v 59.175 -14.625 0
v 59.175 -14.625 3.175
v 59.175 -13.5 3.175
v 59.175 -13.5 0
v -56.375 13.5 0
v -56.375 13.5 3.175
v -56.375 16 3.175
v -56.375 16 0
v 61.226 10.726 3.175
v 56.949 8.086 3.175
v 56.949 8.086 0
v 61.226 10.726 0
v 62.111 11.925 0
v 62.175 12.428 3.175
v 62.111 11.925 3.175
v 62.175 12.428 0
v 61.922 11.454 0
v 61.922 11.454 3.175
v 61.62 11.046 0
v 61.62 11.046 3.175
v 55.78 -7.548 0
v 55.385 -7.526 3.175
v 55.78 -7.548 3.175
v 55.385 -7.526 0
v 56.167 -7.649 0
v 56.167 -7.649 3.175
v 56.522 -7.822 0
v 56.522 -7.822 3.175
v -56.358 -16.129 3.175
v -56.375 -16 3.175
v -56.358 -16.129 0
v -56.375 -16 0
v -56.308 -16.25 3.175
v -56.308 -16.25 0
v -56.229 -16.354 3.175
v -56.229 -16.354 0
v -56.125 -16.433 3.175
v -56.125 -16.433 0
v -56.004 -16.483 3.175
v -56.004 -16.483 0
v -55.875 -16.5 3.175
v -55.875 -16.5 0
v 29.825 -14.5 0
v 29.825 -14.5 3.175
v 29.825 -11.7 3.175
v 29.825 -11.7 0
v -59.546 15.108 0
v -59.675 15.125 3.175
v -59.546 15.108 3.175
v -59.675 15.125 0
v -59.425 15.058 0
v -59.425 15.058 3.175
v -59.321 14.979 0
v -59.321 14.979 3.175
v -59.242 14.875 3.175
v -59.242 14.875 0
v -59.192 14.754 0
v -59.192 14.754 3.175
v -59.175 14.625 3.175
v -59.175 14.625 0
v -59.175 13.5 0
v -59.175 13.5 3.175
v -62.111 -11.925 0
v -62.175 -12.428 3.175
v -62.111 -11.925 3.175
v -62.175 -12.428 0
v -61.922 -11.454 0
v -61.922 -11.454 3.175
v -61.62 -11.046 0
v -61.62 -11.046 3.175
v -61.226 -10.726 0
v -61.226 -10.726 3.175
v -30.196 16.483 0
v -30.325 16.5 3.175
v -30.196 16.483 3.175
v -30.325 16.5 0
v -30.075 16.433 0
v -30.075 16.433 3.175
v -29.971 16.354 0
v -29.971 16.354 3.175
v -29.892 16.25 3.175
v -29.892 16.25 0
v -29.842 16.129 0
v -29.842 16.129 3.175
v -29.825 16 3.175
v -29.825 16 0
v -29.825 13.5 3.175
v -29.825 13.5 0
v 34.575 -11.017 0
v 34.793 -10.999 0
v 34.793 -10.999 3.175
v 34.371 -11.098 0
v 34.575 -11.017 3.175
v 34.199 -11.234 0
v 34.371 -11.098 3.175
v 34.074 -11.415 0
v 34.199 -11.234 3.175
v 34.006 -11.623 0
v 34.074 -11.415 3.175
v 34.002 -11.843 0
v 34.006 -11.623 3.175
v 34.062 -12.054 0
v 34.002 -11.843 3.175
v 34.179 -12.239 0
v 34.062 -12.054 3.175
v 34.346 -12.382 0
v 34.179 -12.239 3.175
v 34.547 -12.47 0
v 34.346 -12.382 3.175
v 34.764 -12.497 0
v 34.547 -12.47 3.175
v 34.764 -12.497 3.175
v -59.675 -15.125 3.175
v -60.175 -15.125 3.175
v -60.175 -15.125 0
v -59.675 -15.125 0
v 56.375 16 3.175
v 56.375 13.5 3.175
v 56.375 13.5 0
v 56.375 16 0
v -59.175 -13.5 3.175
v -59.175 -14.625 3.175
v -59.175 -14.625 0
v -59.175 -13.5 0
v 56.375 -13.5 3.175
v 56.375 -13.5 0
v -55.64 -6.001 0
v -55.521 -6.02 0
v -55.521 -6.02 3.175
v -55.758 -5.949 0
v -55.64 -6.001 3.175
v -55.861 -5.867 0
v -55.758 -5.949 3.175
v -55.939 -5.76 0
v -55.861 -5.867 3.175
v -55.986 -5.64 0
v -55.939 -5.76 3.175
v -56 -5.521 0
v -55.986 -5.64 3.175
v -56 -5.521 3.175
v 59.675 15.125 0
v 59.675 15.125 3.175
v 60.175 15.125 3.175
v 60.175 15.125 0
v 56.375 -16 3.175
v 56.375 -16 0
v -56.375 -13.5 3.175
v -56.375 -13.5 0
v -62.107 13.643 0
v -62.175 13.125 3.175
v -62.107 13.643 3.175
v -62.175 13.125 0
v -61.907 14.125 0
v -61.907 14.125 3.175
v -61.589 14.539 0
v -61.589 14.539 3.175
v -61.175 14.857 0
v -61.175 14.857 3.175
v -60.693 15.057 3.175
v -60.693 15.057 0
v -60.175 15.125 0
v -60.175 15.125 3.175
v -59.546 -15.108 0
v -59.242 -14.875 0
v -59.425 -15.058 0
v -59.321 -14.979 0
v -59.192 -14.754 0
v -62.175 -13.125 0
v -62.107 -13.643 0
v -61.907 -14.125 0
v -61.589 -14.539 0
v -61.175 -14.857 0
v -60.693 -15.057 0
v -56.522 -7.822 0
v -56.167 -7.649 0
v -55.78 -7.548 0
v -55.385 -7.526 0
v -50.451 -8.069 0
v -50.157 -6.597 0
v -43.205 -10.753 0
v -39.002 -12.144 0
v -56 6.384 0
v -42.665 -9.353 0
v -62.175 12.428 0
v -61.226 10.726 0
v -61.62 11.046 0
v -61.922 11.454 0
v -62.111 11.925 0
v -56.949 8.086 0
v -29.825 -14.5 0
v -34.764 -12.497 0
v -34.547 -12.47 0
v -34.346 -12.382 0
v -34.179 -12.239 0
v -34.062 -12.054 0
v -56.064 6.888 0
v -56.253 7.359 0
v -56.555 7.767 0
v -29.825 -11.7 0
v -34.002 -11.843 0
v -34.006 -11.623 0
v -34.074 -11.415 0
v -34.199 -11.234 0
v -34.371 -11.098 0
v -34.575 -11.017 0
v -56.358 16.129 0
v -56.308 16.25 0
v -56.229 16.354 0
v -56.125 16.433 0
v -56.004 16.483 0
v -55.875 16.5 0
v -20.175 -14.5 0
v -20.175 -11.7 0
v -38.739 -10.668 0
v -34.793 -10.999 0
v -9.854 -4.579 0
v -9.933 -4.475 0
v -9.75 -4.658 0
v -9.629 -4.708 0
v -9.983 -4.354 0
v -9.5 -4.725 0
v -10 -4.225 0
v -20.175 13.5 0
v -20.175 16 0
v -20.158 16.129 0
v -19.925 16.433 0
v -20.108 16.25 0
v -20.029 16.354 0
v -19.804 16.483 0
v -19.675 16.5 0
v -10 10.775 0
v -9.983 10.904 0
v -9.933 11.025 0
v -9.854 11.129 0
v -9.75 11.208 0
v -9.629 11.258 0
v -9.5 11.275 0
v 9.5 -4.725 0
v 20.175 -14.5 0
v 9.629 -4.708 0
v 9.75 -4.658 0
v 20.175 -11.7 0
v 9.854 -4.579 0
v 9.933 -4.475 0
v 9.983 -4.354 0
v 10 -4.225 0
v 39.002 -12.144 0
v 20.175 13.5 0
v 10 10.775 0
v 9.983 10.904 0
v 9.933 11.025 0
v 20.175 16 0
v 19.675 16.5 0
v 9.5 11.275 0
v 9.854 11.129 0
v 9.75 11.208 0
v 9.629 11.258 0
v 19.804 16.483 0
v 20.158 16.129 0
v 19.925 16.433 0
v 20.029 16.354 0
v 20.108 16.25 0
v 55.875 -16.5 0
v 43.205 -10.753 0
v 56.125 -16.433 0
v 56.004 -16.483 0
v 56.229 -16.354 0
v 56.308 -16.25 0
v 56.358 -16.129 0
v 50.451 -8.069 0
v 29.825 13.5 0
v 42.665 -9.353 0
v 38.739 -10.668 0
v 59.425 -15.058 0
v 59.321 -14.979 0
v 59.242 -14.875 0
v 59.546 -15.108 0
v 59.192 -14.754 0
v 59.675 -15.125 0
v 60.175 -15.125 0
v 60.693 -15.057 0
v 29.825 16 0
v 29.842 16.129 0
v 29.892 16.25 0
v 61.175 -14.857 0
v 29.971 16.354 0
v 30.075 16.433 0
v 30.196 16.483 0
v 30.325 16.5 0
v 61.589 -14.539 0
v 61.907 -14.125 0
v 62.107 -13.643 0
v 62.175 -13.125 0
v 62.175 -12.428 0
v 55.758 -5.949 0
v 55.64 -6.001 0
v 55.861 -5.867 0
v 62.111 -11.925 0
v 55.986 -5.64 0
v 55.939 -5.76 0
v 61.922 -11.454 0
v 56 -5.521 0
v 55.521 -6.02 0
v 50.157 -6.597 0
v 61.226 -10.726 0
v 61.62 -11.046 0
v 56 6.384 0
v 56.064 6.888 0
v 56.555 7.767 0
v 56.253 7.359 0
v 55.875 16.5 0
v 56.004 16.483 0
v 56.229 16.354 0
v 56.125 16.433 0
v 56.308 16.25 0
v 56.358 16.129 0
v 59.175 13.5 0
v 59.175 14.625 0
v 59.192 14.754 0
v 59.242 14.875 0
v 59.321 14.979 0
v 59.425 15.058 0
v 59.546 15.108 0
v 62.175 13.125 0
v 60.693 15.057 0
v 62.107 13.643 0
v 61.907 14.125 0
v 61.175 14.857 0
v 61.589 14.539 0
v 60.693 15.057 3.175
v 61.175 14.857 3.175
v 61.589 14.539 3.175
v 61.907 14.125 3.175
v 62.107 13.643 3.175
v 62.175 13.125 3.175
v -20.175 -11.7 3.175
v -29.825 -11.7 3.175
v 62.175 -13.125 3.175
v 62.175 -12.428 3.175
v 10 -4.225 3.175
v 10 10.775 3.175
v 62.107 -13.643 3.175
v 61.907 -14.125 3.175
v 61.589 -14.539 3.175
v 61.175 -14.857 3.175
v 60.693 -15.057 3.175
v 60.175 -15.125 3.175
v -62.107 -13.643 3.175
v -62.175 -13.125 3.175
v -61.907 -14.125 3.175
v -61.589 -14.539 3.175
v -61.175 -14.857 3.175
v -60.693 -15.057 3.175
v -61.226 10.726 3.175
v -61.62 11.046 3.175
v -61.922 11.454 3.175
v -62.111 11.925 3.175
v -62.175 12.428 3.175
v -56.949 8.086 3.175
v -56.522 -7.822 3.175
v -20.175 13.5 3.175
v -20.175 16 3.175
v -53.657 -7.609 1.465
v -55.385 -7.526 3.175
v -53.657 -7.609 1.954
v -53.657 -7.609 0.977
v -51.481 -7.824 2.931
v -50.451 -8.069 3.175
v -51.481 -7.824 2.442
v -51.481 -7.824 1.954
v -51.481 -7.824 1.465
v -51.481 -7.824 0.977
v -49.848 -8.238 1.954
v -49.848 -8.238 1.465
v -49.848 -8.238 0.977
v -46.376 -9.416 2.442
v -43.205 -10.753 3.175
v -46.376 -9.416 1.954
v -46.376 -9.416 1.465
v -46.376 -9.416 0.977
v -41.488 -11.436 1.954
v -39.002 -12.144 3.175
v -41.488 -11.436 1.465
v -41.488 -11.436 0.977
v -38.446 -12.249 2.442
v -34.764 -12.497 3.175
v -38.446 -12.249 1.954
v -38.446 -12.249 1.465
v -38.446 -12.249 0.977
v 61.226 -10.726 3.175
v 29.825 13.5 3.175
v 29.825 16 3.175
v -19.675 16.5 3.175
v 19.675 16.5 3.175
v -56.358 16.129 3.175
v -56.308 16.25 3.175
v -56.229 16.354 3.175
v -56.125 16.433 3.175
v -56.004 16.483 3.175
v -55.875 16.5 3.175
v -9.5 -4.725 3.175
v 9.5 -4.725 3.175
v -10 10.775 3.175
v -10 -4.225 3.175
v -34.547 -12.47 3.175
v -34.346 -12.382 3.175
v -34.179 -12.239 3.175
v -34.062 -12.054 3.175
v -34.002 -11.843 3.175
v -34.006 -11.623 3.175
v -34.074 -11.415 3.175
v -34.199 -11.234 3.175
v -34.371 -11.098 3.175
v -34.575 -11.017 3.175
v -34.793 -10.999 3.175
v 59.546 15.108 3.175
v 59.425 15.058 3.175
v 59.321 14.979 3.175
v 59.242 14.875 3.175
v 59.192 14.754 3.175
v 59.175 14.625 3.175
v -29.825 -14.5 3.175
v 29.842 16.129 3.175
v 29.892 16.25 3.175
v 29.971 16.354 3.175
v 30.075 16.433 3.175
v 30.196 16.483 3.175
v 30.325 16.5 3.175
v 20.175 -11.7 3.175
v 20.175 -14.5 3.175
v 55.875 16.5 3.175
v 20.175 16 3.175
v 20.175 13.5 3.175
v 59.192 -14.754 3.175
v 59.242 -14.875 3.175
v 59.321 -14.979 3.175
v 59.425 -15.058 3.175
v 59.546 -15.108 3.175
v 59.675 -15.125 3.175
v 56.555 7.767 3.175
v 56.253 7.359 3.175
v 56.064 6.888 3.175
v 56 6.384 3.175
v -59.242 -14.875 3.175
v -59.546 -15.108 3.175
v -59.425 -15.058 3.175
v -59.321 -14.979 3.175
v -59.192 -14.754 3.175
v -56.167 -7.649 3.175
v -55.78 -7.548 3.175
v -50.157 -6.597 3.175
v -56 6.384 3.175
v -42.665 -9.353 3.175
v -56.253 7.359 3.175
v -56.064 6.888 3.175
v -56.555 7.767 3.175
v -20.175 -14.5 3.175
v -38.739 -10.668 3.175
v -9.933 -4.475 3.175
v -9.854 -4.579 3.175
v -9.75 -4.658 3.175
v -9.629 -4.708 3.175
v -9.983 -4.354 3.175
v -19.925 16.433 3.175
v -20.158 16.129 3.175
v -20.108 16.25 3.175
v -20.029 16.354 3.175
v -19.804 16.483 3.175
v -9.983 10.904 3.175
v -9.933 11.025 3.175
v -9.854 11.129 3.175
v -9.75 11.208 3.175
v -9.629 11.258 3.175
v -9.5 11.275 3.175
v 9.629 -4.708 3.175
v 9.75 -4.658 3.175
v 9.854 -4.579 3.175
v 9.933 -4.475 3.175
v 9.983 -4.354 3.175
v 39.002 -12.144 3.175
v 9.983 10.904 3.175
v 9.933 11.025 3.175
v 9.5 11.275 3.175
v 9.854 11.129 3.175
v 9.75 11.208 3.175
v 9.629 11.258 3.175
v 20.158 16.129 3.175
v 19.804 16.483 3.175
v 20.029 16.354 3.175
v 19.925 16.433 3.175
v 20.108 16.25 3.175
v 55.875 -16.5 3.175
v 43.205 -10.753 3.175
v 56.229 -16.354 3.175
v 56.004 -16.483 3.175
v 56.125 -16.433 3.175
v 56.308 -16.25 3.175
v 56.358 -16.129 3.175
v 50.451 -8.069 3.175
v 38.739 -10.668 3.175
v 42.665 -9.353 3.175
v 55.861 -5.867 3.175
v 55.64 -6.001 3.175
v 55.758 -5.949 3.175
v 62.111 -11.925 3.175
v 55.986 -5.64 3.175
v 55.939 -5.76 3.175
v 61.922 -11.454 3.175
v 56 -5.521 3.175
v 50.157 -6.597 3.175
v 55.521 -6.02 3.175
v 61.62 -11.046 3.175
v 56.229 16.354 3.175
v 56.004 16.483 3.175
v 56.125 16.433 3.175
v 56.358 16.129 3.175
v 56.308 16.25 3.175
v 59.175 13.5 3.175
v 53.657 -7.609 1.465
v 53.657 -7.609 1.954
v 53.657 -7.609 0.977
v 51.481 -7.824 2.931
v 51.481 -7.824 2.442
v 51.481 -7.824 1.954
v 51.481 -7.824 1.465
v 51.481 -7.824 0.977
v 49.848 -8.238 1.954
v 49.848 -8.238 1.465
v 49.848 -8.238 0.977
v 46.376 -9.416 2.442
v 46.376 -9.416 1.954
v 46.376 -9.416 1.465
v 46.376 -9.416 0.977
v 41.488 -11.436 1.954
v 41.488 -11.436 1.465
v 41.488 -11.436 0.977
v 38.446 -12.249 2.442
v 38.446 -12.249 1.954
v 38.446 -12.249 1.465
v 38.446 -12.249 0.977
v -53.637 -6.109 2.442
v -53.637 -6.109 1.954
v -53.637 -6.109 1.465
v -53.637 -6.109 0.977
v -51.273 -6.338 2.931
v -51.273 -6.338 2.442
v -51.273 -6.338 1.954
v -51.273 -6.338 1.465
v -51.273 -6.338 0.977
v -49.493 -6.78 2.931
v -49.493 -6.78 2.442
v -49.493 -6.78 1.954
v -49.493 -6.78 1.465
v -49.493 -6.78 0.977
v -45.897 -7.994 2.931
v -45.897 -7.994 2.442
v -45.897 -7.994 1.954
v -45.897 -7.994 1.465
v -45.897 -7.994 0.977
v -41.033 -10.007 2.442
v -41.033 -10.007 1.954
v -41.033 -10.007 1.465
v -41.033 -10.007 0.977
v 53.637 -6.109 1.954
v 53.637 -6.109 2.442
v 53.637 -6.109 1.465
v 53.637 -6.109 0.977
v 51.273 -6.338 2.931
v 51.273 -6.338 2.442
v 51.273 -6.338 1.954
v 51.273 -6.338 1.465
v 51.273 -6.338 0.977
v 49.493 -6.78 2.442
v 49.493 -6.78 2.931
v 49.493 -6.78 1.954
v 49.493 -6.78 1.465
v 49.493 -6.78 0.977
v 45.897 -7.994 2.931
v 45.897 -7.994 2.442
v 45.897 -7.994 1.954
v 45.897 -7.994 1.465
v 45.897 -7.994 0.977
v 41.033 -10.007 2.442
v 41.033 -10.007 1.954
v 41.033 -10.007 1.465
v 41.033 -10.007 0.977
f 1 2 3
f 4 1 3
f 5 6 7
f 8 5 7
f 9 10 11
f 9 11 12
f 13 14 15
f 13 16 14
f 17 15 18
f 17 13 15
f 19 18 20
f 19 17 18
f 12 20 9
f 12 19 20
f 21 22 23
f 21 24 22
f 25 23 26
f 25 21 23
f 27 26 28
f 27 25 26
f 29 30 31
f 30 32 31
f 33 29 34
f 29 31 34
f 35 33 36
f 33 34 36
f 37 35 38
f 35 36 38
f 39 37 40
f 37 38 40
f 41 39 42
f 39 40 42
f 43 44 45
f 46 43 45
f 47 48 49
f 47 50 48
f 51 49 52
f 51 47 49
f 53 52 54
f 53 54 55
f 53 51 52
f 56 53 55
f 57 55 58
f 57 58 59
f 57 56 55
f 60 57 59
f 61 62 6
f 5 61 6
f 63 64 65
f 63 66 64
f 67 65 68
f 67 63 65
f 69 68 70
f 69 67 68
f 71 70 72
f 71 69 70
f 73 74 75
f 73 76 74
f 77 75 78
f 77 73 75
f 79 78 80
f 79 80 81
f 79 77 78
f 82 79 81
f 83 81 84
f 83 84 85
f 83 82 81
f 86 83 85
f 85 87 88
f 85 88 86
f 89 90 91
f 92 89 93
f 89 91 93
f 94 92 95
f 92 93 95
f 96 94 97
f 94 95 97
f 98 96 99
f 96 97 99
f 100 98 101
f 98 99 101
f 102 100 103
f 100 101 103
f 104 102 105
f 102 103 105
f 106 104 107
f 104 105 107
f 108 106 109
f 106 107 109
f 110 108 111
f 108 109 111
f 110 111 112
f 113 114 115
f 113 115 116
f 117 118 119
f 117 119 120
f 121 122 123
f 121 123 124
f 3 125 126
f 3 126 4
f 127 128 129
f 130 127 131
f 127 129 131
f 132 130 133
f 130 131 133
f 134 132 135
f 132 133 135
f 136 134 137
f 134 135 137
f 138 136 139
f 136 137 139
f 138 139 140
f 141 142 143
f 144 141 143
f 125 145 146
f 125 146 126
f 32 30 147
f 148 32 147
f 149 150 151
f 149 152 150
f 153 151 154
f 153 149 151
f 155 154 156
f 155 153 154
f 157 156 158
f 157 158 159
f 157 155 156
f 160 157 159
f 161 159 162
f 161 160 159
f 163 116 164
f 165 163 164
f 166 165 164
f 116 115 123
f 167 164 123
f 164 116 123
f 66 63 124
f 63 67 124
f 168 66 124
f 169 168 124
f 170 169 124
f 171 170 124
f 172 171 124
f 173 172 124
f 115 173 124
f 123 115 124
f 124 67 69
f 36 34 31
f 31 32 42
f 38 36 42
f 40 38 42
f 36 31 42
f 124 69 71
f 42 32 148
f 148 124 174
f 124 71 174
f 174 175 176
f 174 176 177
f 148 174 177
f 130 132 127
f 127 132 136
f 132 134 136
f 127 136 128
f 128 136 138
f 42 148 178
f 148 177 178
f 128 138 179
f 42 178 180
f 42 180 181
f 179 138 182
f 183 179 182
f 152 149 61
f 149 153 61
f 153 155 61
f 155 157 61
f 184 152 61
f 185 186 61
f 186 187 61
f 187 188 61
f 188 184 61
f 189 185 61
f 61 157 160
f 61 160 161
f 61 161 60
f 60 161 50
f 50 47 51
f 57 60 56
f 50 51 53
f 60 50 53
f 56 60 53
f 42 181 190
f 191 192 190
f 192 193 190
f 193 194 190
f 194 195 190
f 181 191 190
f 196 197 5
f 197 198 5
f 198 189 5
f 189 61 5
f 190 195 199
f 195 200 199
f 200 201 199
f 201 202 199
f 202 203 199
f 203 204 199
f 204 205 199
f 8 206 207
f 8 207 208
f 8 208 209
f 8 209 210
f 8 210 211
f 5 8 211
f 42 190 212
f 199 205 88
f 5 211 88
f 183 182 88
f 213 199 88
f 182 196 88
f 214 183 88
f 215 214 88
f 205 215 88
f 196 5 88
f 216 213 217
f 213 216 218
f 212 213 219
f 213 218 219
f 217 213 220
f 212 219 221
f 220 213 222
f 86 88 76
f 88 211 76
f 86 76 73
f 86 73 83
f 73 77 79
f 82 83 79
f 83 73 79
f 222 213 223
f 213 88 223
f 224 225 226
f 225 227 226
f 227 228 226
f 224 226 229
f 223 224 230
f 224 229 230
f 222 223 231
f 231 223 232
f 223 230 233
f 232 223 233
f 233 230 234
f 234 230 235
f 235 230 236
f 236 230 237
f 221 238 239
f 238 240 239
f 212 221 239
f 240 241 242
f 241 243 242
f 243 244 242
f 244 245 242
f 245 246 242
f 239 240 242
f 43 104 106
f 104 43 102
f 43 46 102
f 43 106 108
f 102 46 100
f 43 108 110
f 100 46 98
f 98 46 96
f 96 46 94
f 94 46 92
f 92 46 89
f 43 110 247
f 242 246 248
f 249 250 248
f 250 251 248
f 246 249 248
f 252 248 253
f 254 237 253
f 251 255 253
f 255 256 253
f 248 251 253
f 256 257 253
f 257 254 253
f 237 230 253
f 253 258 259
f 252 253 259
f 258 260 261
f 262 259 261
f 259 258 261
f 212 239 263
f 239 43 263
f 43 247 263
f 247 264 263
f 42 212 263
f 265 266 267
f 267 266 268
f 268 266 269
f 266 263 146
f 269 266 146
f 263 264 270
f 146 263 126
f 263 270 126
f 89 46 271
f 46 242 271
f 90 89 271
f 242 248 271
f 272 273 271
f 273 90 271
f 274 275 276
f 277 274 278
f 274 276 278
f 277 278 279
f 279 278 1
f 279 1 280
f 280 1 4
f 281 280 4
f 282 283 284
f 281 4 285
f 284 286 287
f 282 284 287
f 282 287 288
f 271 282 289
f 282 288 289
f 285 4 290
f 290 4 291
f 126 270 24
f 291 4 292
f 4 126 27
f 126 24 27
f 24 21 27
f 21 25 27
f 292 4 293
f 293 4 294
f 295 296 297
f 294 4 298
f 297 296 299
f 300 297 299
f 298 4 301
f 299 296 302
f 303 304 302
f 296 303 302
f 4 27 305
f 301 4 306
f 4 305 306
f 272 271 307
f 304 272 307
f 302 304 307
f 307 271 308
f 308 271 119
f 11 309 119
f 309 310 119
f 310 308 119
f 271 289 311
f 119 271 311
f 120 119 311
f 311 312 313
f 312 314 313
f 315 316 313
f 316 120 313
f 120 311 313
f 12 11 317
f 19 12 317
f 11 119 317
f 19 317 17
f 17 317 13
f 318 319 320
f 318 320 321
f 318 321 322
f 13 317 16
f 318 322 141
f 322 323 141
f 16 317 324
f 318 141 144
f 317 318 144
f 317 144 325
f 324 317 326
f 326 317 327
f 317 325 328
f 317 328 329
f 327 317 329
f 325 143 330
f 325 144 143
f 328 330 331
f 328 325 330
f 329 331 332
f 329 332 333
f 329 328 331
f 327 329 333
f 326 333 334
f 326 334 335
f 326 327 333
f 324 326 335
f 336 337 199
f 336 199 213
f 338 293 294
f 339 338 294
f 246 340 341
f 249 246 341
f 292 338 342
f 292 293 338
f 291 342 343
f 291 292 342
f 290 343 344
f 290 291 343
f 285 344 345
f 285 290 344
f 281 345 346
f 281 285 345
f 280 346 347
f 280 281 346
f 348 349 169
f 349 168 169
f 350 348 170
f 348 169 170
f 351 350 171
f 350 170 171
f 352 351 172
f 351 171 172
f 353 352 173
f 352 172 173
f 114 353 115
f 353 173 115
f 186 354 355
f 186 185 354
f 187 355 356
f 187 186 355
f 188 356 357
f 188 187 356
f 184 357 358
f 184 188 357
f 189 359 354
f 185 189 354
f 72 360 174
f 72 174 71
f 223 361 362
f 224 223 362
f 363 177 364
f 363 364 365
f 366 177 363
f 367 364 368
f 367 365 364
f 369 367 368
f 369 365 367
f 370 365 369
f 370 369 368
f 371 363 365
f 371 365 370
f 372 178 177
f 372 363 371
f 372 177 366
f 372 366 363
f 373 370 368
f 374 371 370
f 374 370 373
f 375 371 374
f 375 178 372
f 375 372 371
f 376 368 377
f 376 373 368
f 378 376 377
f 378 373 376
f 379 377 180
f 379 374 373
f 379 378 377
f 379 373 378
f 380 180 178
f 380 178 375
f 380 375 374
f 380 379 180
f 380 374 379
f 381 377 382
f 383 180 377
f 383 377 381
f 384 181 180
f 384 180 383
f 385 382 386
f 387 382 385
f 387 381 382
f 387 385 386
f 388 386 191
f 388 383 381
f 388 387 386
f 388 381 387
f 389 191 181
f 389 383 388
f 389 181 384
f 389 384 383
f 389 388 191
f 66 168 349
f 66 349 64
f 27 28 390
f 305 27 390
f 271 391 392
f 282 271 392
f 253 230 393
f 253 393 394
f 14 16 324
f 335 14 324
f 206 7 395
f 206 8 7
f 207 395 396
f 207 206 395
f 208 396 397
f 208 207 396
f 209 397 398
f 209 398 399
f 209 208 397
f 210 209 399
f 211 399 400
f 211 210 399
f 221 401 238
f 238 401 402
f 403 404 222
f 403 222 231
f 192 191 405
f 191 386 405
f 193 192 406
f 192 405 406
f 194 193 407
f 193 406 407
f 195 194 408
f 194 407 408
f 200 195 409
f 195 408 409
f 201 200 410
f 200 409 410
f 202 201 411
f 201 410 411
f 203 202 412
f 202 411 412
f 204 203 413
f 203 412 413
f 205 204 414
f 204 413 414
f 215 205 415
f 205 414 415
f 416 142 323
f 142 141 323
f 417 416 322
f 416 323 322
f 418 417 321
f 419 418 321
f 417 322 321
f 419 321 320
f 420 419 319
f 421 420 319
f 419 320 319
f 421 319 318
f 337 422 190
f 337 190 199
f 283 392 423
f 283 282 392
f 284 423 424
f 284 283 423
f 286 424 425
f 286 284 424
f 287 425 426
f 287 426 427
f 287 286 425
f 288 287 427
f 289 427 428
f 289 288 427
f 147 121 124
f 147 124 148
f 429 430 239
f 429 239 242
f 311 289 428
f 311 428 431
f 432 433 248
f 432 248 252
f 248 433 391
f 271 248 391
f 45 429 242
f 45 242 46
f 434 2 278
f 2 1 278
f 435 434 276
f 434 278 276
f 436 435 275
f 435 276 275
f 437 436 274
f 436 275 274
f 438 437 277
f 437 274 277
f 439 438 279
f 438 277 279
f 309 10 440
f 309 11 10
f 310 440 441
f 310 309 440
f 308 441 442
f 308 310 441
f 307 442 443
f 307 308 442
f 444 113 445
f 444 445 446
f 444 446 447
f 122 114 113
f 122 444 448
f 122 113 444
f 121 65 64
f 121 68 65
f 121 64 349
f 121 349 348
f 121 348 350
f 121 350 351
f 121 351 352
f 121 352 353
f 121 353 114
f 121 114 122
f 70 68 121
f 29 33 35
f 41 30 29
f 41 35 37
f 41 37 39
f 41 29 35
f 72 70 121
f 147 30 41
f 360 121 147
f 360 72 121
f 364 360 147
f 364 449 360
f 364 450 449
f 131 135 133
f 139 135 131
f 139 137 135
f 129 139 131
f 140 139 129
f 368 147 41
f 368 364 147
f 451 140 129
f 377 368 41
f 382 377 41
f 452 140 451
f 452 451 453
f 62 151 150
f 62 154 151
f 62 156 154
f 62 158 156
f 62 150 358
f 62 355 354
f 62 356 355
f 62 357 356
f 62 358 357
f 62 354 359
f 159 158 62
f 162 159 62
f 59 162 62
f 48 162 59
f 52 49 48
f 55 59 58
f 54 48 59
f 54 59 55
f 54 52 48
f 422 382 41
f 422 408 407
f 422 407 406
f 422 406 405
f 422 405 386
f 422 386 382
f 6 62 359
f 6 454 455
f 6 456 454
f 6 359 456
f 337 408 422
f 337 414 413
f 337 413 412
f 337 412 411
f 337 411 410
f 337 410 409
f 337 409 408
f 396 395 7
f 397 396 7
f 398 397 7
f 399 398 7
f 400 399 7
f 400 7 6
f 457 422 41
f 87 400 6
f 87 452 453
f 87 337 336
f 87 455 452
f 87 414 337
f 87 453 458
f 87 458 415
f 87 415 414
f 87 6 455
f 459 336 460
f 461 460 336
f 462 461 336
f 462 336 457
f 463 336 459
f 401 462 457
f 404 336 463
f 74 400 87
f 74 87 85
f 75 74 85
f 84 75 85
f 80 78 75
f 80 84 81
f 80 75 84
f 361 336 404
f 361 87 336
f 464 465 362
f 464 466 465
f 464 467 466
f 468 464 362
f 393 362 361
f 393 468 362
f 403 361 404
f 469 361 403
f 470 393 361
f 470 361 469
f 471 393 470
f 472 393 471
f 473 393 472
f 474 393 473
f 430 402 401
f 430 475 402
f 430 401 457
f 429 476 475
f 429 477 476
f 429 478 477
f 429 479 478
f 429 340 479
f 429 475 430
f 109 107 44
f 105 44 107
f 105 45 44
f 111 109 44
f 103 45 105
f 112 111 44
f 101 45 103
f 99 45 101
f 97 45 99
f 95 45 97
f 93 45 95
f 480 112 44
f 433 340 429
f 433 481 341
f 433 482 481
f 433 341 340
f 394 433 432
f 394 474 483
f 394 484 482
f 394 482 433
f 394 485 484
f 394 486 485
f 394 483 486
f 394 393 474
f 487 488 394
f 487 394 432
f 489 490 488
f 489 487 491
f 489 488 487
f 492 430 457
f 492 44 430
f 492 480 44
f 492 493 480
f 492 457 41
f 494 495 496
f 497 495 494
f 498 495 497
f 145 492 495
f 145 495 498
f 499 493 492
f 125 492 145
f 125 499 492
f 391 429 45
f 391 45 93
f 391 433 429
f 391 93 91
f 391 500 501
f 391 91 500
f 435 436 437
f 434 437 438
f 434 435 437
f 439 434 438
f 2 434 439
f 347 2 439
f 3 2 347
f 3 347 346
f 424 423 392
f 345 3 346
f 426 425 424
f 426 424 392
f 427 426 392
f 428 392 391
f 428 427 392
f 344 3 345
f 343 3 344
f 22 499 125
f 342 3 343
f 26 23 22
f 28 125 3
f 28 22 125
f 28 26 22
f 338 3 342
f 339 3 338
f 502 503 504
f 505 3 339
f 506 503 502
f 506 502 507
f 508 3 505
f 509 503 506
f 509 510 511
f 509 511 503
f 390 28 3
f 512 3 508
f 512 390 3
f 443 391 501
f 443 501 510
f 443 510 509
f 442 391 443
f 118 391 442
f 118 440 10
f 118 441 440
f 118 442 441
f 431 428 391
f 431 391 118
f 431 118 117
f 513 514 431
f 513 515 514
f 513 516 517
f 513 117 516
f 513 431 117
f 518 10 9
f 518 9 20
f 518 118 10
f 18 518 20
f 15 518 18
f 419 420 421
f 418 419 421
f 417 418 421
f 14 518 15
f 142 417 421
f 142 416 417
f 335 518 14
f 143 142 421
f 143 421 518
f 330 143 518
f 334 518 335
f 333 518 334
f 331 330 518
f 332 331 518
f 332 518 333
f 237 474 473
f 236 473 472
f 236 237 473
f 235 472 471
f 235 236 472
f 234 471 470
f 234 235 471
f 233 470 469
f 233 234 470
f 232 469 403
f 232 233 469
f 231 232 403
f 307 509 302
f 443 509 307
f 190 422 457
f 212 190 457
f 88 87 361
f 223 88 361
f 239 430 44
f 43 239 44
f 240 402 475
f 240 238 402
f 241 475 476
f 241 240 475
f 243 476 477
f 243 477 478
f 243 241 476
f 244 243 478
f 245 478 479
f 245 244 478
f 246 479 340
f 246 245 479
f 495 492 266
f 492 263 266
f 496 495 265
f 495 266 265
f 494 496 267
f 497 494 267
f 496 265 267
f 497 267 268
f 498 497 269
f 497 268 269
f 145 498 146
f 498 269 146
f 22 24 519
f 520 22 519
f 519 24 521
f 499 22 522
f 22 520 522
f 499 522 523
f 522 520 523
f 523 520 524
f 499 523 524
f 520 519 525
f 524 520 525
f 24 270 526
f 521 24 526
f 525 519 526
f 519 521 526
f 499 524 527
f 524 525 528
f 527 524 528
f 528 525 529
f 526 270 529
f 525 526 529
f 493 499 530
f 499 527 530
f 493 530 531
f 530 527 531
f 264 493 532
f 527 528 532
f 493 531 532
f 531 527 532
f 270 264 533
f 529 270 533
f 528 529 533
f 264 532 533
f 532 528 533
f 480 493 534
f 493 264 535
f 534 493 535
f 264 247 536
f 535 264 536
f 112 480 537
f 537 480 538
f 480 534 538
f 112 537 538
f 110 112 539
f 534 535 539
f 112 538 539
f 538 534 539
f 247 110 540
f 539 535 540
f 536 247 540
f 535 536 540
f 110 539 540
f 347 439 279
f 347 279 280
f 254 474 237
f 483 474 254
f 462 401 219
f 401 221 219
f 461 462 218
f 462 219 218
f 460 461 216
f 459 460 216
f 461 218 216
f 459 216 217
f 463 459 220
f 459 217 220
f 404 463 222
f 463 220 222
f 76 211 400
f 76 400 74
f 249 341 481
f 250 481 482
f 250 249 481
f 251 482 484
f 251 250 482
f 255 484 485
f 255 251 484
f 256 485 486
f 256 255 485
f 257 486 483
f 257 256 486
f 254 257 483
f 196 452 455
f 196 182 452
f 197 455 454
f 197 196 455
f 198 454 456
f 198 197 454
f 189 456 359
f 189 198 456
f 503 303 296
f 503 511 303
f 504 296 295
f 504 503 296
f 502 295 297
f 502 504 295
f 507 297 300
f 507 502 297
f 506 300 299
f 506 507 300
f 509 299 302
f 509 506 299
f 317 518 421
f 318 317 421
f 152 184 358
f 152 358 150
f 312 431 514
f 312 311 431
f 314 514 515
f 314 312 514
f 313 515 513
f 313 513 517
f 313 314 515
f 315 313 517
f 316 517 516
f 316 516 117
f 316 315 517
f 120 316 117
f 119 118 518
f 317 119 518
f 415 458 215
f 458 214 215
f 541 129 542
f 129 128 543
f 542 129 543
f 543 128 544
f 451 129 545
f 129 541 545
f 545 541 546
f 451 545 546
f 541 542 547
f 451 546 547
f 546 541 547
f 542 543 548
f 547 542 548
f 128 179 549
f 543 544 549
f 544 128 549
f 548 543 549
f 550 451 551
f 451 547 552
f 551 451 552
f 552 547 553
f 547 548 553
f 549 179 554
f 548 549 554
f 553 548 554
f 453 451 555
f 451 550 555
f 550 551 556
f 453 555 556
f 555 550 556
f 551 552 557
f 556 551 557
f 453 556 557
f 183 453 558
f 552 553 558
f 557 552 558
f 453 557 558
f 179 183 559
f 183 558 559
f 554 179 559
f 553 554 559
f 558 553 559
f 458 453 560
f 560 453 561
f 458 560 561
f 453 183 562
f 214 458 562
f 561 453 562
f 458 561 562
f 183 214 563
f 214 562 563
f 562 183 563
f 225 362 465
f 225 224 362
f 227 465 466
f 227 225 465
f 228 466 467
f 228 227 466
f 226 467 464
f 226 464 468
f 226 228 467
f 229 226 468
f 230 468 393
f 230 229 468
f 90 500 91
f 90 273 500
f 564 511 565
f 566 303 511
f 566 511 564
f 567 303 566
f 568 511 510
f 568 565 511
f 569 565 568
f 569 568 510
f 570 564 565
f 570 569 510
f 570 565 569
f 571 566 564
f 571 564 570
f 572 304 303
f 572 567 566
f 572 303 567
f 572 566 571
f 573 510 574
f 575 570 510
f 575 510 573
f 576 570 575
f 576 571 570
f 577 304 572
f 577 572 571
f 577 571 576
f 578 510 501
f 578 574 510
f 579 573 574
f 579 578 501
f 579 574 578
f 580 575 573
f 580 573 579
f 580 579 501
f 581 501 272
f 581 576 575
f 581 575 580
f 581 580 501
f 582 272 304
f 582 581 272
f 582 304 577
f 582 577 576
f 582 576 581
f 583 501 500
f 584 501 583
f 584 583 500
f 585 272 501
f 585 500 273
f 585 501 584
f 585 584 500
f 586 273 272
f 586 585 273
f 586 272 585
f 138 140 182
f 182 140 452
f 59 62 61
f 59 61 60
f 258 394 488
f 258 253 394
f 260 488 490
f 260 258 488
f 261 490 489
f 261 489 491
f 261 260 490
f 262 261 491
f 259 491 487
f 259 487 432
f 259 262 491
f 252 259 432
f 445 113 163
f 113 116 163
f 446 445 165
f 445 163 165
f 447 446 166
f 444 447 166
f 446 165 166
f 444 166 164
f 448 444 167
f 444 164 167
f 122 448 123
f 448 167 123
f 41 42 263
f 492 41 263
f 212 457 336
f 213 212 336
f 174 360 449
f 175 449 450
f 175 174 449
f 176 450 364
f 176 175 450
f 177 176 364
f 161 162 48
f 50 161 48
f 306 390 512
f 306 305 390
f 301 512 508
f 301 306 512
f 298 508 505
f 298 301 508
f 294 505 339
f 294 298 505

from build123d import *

# Parameters (mm, degrees)
SKETCH1_W           = 124.35
SKETCH1_H           = 33
BOSS_EXTRUDE1_DEPTH = 3.175
SKETCH2_W           = 9.65
SKETCH2_H           = 2.8
SKETCH2_H_2         = 3
CUT_EXTRUDE1_DEPTH  = 65.405444257
SKETCH4_W           = 2.8
SKETCH4_H           = 3
SKETCH4_W_2         = 6.175
SKETCH4_H_2         = 15
CUT_EXTRUDE2_DEPTH  = 65.405444257
SKETCH6_W           = 3
SKETCH6_H           = 1.375
CUT_EXTRUDE3_DEPTH  = 65.405444257
CUT_SWEEP1_DEPTH    = 3.175
SKETCH12_R          = 0.75
CUT_EXTRUDE6_DEPTH  = 65.405444385
CUT_EXTRUDE7_DEPTH  = 65.405444385
FILLET6_R           = 2
FILLET7_R           = 0.5
SKETCH14_W          = 20
SKETCH14_H          = 16
CUT_EXTRUDE8_DEPTH  = 65.405444385
FILLET8_R           = 0.5


# Read off the part's stored shape, not the designer's step: Cut-Sweep1
with BuildPart() as part:
    # Sketch1 → Boss-Extrude1 (new body)
    with BuildSketch(Plane.XY):
        Rectangle(SKETCH1_W, SKETCH1_H)
    extrude(amount=BOSS_EXTRUDE1_DEPTH)

    # Sketch2 → Cut-Extrude1 (cut, through all)
    with BuildSketch(Plane.XY.offset(3.175)):
        with Locations((-25, -13.1)):
            Rectangle(SKETCH2_W, SKETCH2_H)
        with Locations((25, -13.1)):
            Rectangle(SKETCH2_W, SKETCH2_H)
        with Locations((-25, 15)):
            Rectangle(SKETCH2_W, SKETCH2_H_2)
        with Locations((25, 15)):
            Rectangle(SKETCH2_W, SKETCH2_H_2)
    extrude(amount=-CUT_EXTRUDE1_DEPTH, mode=Mode.SUBTRACT)

    # Sketch4 → Cut-Extrude2 (cut, through all)
    with BuildSketch(Plane.XY.offset(3.175)):
        with Locations((-57.775, 15)):
            Rectangle(SKETCH4_W, SKETCH4_H)
        with Locations((-59.0875, 0)):
            Rectangle(SKETCH4_W_2, SKETCH4_H_2)
        with Locations((-57.775, -15)):
            Rectangle(SKETCH4_W, SKETCH4_H)
        with Locations((57.775, 15)):
            Rectangle(SKETCH4_W, SKETCH4_H)
        with Locations((59.0875, 0)):
            Rectangle(SKETCH4_W_2, SKETCH4_H_2)
        with Locations((57.775, -15)):
            Rectangle(SKETCH4_W, SKETCH4_H)
    extrude(amount=-CUT_EXTRUDE2_DEPTH, mode=Mode.SUBTRACT)

    # Sketch6 → Cut-Extrude3 (cut, through all)
    with BuildSketch(Plane.XY.offset(3.175)):
        with Locations((-60.675, 15.8125)):
            Rectangle(SKETCH6_W, SKETCH6_H)
        with Locations((-60.675, -15.8125)):
            Rectangle(SKETCH6_W, SKETCH6_H)
        with Locations((60.675, 15.8125)):
            Rectangle(SKETCH6_W, SKETCH6_H)
        with Locations((60.675, -15.8125)):
            Rectangle(SKETCH6_W, SKETCH6_H)
    extrude(amount=-CUT_EXTRUDE3_DEPTH, mode=Mode.SUBTRACT)

    # Cut-Sweep1 outline → Cut-Sweep1 (cut)
    with BuildSketch(Plane.XY):
        with BuildLine():
            add(Edge.make_bspline(
                [(-56, -6), (-55.016272395, -6.040912607), (-53.484317245, -6.110006936), (-52.10462272, -6.208217255), (-51.370216858, -6.312882143), (-50.849013323, -6.424427059), (-50.274077583, -6.562740427), (-49.507561658, -6.770408498), (-47.98416767, -7.234467607), (-46.535590196, -7.742954919), (-44.899823838, -8.383891144), (-43.265010906, -9.091671777), (-41.074137026, -10.055384808), (-38.357692762, -10.850187014), (-36.1078612, -11.027108547), (-34.793437631, -10.999002823)],
                knots=[0, 0, 0, 0, 0.052266667, 0.104533333, 0.1568, 0.188540911, 0.209066667, 0.261333333, 0.3136, 0.4368, 0.46346514, 0.56, 0.706666667, 0.853333333, 1, 1, 1, 1], degree=3))
            Line((-56, -6), (-56, -7.5))
            add(Edge.make_bspline(
                [(-56, -7.5), (-55.020423649, -7.540842864), (-53.496771007, -7.609797709), (-52.171479553, -7.70829789), (-51.569513747, -7.80075633), (-51.115986388, -7.900930823), (-50.592043829, -8.028791809), (-49.863497697, -8.22781936), (-48.398796638, -8.676488924), (-46.992197023, -9.172450468), (-45.412650318, -9.7933523), (-43.831176536, -10.480660701), (-41.561928867, -11.478467634), (-38.556226285, -12.350501385), (-36.110914304, -12.525218982), (-34.698750526, -12.49601129)],
                knots=[0, 0, 0, 0, 0.052266667, 0.104533333, 0.1568, 0.188540911, 0.209066667, 0.261333333, 0.3136, 0.4368, 0.46346514, 0.56, 0.706666667, 0.853333333, 1, 1, 1, 1], degree=3))
            Line((-34.698750526, -12.49601129), (-34.793437631, -10.999002823))
        make_face()
    cut_sweep1 = extrude(amount=CUT_SWEEP1_DEPTH, mode=Mode.SUBTRACT)

    # Mirror1: Cut-Sweep1 across plane
    add(cut_sweep1.mirror(Plane.ZY), mode=Mode.SUBTRACT)

    # Sketch12 → Cut-Extrude6 (cut, through all)
    with BuildSketch(Plane.XY.offset(3.175)):
        with Locations((-34.746094079, -11.747507056)):
            Circle(SKETCH12_R)
        with Locations((34.746094079, -11.747507056)):
            Circle(SKETCH12_R)
    extrude(amount=-CUT_EXTRUDE6_DEPTH, mode=Mode.SUBTRACT)

    # Sketch13 → Cut-Extrude7 (cut, through all)
    with BuildSketch(Plane.XY.offset(3.175)):
        Polygon((-56, 7.5), (-62.175, 11.3125), (-62.175, 7.5), align=None)
        Polygon((-56, -7.5), (-62.175, -11.3125), (-62.175, -7.5), align=None)
        Polygon((56, 7.5), (62.175, 11.3125), (62.175, 7.5), align=None)
        Polygon((56, -7.5), (62.175, -11.3125), (62.175, -7.5), align=None)
    extrude(amount=-CUT_EXTRUDE7_DEPTH, mode=Mode.SUBTRACT)

    # Fillet6
    fillet6_edges = [part.edges().sort_by_distance(p)[0] for p in [
        (62.175, -15.125, 1.5875),
        (62.175, -11.3125, 1.5875),
        (56, -7.5, 1.5875),
        (56, 7.5, 1.5875),
        (62.175, 11.3125, 1.5875),
        (62.175, 15.125, 1.5875),
        (-62.175, -15.125, 1.5875),
        (-62.175, -11.3125, 1.5875),
        (-56, -7.5, 1.5875),
        (-62.175, 15.125, 1.5875),
        (-62.175, 11.3125, 1.5875),
        (-56, 7.5, 1.5875),
    ]]
    fillet(fillet6_edges, radius=FILLET6_R)

    # Fillet7
    fillet7_edges = [part.edges().sort_by_distance(p)[0] for p in [
        (59.175, 15.125, 1.5875),
        (59.175, -15.125, 1.5875),
        (-59.175, -15.125, 1.5875),
        (-59.175, 15.125, 1.5875),
        (20.175, 16.5, 1.5875),
        (29.825, 16.5, 1.5875),
        (-20.175, 16.5, 1.5875),
        (-29.825, 16.5, 1.5875),
        (56.375, -16.5, 1.5875),
        (56, -6, 1.5875),
        (56.375, 16.5, 1.5875),
        (-56.375, 16.5, 1.5875),
        (-56.375, -16.5, 1.5875),
        (-56, -6, 1.5875),
    ]]
    fillet(fillet7_edges, radius=FILLET7_R)

    # Sketch14 → Cut-Extrude8 (cut, through all)
    with BuildSketch(Plane.XY.offset(3.175)):
        with Locations((0, 3.275)):
            Rectangle(SKETCH14_W, SKETCH14_H)
    extrude(amount=-CUT_EXTRUDE8_DEPTH, mode=Mode.SUBTRACT)

    # Fillet8
    fillet8_edges = [part.edges().sort_by_distance(p)[0] for p in [
        (-10, -4.725, 1.5875),
        (-10, 11.275, 1.5875),
        (10, 11.275, 1.5875),
        (10, -4.725, 1.5875),
    ]]
    fillet(fillet8_edges, radius=FILLET8_R)


solid = part.part
